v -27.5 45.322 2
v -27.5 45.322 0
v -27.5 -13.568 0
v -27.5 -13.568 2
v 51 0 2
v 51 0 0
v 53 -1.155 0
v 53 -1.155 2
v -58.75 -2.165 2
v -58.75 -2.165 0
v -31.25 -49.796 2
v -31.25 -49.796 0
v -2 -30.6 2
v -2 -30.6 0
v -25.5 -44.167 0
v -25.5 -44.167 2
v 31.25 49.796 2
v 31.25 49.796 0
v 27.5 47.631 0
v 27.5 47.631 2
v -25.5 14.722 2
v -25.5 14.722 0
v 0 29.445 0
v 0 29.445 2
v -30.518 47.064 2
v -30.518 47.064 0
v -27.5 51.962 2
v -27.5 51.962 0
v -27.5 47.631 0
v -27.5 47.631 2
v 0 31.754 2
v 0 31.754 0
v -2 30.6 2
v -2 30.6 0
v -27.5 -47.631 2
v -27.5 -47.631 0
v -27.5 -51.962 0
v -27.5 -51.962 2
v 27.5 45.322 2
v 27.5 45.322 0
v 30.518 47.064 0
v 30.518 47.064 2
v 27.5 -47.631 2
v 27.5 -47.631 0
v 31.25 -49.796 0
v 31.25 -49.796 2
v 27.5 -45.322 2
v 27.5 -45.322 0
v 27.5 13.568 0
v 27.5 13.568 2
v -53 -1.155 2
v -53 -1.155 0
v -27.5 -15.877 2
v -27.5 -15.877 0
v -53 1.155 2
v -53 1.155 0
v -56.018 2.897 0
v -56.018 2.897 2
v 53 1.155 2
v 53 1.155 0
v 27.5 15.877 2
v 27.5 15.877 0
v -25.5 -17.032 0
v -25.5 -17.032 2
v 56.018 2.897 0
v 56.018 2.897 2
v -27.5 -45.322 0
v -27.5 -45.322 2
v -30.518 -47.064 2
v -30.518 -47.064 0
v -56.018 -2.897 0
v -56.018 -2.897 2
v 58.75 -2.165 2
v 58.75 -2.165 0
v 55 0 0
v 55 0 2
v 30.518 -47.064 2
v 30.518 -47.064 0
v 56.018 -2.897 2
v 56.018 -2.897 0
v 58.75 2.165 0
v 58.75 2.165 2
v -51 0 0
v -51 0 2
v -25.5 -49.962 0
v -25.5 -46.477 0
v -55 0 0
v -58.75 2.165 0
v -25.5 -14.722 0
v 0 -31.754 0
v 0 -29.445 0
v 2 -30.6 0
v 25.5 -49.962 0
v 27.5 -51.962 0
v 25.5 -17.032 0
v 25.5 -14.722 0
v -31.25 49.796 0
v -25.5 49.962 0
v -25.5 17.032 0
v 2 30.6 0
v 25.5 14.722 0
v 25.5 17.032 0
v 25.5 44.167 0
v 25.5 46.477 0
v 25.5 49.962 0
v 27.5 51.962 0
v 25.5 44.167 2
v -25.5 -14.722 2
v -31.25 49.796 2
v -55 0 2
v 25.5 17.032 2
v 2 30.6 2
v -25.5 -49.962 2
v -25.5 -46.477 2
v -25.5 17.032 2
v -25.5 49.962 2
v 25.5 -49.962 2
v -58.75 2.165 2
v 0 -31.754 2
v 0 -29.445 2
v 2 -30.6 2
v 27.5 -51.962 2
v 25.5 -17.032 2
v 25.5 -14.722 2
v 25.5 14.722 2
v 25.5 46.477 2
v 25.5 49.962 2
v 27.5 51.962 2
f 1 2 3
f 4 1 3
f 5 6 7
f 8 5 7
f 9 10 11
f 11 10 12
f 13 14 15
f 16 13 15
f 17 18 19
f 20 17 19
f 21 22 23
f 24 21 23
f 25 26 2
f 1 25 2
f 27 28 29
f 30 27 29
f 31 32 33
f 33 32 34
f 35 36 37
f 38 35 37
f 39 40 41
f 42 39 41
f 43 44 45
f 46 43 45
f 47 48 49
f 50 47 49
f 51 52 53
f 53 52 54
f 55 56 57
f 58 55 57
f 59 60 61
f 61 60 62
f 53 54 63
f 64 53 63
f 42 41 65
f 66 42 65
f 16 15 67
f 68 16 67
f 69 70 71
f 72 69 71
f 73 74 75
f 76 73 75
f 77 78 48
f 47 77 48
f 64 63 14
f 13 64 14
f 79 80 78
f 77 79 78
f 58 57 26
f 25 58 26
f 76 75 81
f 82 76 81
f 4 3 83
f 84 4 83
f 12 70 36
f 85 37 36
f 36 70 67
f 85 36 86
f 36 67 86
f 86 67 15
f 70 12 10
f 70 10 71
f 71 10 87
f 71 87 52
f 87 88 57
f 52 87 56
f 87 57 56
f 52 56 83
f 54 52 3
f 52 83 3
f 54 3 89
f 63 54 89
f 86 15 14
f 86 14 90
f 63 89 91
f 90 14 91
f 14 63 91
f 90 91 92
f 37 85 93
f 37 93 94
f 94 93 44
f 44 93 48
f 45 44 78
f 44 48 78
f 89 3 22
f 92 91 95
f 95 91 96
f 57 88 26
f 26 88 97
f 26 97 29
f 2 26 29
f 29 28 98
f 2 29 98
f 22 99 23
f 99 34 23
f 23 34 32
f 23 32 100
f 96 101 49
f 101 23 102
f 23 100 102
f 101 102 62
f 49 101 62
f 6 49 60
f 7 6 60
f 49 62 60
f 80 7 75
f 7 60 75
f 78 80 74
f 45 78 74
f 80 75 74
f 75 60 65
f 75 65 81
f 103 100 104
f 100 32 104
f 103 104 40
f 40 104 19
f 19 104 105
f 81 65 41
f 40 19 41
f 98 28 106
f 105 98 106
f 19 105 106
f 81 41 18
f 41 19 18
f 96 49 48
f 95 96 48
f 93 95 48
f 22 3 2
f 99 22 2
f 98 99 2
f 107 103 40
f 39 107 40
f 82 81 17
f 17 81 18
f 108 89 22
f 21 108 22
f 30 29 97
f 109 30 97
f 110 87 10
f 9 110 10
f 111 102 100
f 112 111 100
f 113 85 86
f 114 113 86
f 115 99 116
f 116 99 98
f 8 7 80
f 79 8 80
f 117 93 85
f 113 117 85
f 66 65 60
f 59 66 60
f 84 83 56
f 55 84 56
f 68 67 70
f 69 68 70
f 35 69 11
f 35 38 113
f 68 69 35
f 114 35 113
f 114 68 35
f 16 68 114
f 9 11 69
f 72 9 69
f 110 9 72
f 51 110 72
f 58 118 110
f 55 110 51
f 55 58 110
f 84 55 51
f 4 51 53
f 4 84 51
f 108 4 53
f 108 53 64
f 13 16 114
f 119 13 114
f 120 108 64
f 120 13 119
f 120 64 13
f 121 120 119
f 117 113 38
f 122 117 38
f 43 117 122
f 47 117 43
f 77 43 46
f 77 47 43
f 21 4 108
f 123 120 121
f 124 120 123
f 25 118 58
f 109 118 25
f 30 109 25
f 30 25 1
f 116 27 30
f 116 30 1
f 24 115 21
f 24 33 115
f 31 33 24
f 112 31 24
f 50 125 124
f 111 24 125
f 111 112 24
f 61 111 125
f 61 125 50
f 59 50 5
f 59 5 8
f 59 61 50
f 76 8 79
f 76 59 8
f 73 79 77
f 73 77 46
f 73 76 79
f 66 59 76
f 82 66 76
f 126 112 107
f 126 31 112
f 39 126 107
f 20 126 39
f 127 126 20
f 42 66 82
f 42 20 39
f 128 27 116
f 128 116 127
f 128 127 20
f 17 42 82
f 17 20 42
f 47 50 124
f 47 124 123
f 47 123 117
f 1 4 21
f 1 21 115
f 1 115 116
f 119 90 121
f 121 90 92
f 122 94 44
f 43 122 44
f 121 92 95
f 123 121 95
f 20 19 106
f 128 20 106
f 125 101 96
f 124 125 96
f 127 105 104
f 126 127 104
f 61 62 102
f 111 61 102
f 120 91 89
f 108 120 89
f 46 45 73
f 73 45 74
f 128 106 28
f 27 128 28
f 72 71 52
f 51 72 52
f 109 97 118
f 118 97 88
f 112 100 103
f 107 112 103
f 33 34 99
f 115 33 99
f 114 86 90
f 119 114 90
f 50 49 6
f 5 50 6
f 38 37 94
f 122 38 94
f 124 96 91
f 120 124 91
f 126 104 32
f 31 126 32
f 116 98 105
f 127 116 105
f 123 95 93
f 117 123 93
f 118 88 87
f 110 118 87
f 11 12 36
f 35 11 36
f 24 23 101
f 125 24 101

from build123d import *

# Parameters (mm, degrees)
F1_DEPTH = 2


# Not quite as in the source:
# - a feature names something its author has since deleted; it is built from what else it names


with BuildPart() as f1:
    # F0 (on Top) → F1 (new body)
    with BuildSketch(Plane.XY):
        Polygon((27.5, 51.9615242271), (-27.5, 51.9615242271), (-27.5, 47.6313972081), (-25.5, 46.4766966698), (-25.5, 49.9615242271), (25.5, 49.9615242271), (25.5, 46.4766966698), (27.5, 47.6313972081), align=None)
        Polygon((-25.5, 46.4766966698), (-27.5, 47.6313972081), (-27.5, 45.3219961314), (-25.5, 44.167295593), align=None)
        Polygon((-27.5, 45.3219961314), (-27.5, 47.6313972081), (-31.25, 49.7964607176), (-58.75, 2.1650635095), (-55, 0), (-53, 1.1547005384), (-56.0179491924, 2.897114317), (-30.5179491924, 47.06440991), align=None)
        Polygon((31.25, 49.7964607176), (27.5, 47.6313972081), (27.5, 45.3219961314), (30.5179491924, 47.06440991), (56.0179491924, 2.897114317), (53, 1.1547005384), (55, 0), (58.75, 2.1650635095), align=None)
        Polygon((27.5, 45.3219961314), (27.5, 47.6313972081), (25.5, 46.4766966698), (25.5, 44.167295593), align=None)
        Polygon((-25.5, 44.167295593), (-27.5, 45.3219961314), (-27.5, 15.8771324027), (-25.5, 17.0318329411), align=None)
        Polygon((25.5, 44.167295593), (25.5, 46.4766966698), (0, 31.7542648054), (2, 30.5995642671), align=None)
        Polygon((-25.5, 17.0318329411), (-27.5, 15.8771324027), (-27.5, 13.567731326), (-25.5, 14.7224318643), align=None)
        Polygon((2, 30.5995642671), (0, 31.7542648054), (-2, 30.5995642671), (0, 29.4448637287), align=None)
        Polygon((-25.5, 14.7224318643), (-27.5, 13.567731326), (-27.5, -13.567731326), (-25.5, -14.7224318643), align=None)
        Polygon((-2, 30.5995642671), (-25.5, 17.0318329411), (-25.5, 14.7224318643), (0, 29.4448637287), align=None)
        Polygon((-53, -1.1547005384), (-55, 0), (-58.75, -2.1650635095), (-31.25, -49.7964607176), (-27.5, -47.6313972081), (-27.5, -45.3219961314), (-30.5179491924, -47.06440991), (-56.0179491924, -2.897114317), align=None)
        Polygon((-53, 1.1547005384), (-55, 0), (-53, -1.1547005384), (-51, 0), align=None)
        Polygon((25.5, 17.0318329411), (2, 30.5995642671), (0, 29.4448637287), (25.5, 14.7224318643), align=None)
        Polygon((53, -1.1547005384), (55, 0), (53, 1.1547005384), (51, 0), align=None)
        Polygon((58.75, -2.1650635095), (55, 0), (53, -1.1547005384), (56.0179491924, -2.897114317), (30.5179491924, -47.06440991), (27.5, -45.3219961314), (27.5, -47.6313972081), (31.25, -49.7964607176), align=None)
        Polygon((-25.5, -14.7224318643), (-27.5, -13.567731326), (-27.5, -15.8771324027), (-25.5, -17.0318329411), align=None)
        Polygon((-27.5, -15.8771324027), (-27.5, -13.567731326), (-51, 0), (-53, -1.1547005384), align=None)
        Polygon((27.5, 15.8771324027), (25.5, 17.0318329411), (25.5, 14.7224318643), (27.5, 13.567731326), align=None)
        Polygon((51, 0), (53, 1.1547005384), (27.5, 15.8771324027), (27.5, 13.567731326), align=None)
        Polygon((0, -29.4448637287), (-25.5, -14.7224318643), (-25.5, -17.0318329411), (-2, -30.5995642671), align=None)
        Polygon((27.5, 13.567731326), (25.5, 14.7224318643), (25.5, -14.7224318643), (27.5, -13.567731326), align=None)
        Polygon((2, -30.5995642671), (0, -29.4448637287), (-2, -30.5995642671), (0, -31.7542648054), align=None)
        Polygon((25.5, -14.7224318643), (0, -29.4448637287), (2, -30.5995642671), (25.5, -17.0318329411), align=None)
        Polygon((-27.5, -45.3219961314), (-27.5, -47.6313972081), (-25.5, -46.4766966698), (-25.5, -44.167295593), align=None)
        Polygon((-25.5, -46.4766966698), (-27.5, -47.6313972081), (-27.5, -51.9615242271), (27.5, -51.9615242271), (27.5, -47.6313972081), (25.5, -46.4766966698), (25.5, -49.9615242271), (-25.5, -49.9615242271), align=None)
        Polygon((27.5, -13.567731326), (25.5, -14.7224318643), (25.5, -17.0318329411), (27.5, -15.8771324027), align=None)
        Polygon((25.5, -46.4766966698), (27.5, -47.6313972081), (27.5, -45.3219961314), (25.5, -44.167295593), align=None)
        Polygon((0, -31.7542648054), (-2, -30.5995642671), (-25.5, -44.167295593), (-25.5, -46.4766966698), align=None)
        Polygon((27.5, -15.8771324027), (25.5, -17.0318329411), (25.5, -44.167295593), (27.5, -45.3219961314), align=None)
    extrude(amount=F1_DEPTH)


solid = f1.part
